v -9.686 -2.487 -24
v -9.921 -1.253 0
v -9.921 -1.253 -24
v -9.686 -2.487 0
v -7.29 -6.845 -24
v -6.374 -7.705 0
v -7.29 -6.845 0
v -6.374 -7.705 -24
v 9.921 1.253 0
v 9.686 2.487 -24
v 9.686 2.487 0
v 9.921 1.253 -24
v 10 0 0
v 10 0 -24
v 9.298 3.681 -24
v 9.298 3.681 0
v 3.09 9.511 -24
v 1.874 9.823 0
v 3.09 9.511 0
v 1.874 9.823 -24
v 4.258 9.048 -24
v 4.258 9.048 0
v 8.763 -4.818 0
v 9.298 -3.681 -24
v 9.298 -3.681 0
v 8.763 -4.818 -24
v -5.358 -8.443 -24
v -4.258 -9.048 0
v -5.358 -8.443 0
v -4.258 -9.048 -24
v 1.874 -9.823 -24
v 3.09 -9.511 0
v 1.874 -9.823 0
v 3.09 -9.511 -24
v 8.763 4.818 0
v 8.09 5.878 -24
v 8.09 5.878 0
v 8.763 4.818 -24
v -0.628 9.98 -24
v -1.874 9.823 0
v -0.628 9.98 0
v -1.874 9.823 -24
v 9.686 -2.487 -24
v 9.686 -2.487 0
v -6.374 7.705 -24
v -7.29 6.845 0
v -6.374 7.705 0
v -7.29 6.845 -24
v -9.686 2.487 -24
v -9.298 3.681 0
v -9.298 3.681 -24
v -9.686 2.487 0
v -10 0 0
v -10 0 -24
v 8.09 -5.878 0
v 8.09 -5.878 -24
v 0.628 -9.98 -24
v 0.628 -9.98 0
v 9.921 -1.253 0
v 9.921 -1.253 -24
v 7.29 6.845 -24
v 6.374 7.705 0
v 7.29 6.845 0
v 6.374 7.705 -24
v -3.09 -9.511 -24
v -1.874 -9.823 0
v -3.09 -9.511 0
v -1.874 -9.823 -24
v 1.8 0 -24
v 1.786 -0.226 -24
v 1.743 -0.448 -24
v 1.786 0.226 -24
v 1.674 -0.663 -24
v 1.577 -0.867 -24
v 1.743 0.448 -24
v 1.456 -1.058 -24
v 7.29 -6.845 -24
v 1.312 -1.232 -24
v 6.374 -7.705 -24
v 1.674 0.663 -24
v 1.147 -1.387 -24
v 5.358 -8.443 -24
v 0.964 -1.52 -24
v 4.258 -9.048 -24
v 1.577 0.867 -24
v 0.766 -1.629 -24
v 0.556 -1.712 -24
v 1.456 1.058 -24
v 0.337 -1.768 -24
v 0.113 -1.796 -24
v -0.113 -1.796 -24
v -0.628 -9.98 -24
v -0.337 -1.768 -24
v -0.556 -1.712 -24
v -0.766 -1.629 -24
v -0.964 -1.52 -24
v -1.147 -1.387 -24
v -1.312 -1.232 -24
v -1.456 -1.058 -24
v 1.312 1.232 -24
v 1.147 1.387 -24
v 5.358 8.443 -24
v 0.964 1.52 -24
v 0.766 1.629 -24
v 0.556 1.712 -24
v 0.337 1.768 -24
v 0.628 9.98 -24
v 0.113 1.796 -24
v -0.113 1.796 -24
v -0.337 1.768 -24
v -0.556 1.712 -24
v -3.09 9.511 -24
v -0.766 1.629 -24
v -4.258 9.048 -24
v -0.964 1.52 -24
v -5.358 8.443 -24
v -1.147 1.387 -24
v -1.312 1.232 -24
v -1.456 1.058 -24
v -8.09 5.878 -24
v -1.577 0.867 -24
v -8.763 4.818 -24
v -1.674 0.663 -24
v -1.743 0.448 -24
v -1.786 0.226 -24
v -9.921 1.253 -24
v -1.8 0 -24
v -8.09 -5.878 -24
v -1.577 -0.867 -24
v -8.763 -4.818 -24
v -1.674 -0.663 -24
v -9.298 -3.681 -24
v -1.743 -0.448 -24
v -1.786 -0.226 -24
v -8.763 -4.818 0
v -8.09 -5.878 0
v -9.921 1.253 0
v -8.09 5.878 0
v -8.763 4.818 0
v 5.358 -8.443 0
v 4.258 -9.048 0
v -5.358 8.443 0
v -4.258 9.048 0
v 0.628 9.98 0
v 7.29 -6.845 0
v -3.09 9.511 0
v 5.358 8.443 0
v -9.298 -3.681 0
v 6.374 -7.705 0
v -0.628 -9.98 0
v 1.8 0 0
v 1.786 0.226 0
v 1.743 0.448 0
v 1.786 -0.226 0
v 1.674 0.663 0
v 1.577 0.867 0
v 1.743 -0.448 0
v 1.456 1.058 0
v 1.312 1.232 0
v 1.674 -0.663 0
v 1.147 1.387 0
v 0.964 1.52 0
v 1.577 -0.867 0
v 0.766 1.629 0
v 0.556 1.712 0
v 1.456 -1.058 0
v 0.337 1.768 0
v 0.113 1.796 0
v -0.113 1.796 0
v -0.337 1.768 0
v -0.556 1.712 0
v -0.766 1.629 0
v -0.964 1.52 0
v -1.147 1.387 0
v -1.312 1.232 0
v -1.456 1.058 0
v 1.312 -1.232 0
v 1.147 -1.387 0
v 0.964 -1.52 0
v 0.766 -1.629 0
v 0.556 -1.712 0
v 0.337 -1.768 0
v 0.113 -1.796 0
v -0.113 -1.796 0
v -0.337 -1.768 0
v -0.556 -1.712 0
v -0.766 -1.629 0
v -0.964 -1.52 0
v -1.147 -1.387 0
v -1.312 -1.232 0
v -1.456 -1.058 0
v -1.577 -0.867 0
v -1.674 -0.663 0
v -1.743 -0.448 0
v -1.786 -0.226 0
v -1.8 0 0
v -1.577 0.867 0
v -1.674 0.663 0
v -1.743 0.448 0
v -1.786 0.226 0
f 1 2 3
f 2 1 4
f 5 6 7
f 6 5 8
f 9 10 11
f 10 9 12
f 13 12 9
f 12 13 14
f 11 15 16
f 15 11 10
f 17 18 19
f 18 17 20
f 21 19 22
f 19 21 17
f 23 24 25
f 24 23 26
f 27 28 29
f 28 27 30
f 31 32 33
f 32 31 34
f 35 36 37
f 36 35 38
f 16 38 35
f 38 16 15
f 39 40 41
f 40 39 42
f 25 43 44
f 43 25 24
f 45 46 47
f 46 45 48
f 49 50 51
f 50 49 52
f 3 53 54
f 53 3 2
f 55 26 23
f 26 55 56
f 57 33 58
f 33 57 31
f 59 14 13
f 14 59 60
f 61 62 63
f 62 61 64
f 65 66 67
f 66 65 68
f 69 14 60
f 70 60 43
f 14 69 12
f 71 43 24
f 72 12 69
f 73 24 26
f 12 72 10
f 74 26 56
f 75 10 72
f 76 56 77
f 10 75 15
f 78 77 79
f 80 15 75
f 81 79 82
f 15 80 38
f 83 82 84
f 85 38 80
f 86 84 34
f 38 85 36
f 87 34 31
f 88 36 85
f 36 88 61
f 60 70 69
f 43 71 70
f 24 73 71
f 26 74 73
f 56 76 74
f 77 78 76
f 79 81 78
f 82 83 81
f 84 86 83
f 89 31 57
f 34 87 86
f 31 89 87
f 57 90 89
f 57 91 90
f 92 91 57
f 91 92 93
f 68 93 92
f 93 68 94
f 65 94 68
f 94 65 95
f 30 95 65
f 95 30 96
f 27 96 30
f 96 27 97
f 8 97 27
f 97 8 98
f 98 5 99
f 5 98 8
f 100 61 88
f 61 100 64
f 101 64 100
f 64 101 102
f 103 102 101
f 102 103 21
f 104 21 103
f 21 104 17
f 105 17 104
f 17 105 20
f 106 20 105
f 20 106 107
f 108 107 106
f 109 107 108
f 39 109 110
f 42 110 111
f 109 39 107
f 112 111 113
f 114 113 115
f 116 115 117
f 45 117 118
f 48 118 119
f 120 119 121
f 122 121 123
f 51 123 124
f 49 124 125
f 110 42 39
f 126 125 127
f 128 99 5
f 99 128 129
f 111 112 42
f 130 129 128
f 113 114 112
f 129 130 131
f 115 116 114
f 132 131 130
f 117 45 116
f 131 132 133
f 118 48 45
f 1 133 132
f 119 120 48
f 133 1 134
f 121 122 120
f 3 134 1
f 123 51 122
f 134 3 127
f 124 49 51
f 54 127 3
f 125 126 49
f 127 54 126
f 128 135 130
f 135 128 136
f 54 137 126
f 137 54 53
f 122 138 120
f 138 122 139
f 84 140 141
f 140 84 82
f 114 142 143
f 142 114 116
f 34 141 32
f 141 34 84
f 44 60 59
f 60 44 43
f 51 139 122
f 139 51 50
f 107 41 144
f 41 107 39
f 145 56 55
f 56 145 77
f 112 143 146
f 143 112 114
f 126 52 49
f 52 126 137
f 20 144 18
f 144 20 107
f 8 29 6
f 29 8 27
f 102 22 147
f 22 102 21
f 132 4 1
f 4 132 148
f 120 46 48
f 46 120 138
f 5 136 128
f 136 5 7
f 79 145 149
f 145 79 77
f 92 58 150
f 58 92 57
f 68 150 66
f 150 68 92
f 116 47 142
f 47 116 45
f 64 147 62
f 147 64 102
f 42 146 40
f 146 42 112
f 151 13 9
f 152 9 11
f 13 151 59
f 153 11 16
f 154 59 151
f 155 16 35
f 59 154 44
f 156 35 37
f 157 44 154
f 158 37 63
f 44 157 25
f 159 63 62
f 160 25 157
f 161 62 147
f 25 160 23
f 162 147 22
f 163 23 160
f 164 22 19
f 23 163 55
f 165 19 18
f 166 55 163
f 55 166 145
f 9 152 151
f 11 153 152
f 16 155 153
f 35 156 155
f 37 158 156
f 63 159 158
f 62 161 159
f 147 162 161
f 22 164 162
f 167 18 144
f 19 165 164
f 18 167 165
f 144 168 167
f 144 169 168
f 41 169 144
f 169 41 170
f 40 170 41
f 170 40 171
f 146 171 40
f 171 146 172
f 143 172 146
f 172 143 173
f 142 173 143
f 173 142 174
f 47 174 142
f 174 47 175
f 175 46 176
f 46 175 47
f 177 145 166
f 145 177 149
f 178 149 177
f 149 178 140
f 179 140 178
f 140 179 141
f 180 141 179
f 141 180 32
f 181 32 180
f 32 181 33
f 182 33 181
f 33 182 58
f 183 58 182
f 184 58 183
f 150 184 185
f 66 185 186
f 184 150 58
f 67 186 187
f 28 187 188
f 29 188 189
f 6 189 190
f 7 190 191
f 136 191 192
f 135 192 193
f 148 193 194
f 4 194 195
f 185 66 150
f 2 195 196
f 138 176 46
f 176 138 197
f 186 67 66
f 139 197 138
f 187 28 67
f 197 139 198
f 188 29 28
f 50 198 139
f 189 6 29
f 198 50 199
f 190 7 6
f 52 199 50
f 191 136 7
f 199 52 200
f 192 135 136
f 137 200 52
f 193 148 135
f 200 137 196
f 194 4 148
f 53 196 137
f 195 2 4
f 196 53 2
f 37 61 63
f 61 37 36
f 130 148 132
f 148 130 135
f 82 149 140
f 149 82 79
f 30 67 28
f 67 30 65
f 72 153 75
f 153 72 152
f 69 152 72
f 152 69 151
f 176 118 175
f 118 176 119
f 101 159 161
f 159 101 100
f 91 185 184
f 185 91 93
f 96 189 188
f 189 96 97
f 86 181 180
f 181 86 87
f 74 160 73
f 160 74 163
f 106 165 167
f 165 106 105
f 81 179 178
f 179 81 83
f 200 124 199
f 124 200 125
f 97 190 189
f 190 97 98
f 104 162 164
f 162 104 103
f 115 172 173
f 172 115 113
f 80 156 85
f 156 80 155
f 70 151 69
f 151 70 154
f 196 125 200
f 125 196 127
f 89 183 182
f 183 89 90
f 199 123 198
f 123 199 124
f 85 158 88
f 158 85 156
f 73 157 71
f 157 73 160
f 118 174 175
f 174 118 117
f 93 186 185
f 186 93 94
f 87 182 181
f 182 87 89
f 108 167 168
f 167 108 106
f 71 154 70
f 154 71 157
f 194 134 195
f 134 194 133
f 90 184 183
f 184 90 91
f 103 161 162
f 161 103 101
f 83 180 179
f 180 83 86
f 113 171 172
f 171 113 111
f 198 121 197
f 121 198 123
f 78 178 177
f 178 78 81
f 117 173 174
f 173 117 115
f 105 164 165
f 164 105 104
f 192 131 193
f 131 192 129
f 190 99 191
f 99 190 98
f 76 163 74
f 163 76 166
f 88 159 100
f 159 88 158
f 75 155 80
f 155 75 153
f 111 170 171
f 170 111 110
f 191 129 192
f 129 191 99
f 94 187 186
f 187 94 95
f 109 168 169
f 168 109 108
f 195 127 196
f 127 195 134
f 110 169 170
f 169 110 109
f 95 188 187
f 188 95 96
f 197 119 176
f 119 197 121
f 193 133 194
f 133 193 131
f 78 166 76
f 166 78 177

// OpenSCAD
$fn = 50;


difference() {
	union() {
		translate(v = [0, 0, -24.0000000000]) {
			cylinder(h = 24, r = 10.0000000000);
		}
		cylinder(h = 0, r = 19.0000000000);
	}
	union() {
		#translate(v = [0, 0, -24]) {
			cylinder(h = 24, r = 1.8000000000);
		}
	}
}
